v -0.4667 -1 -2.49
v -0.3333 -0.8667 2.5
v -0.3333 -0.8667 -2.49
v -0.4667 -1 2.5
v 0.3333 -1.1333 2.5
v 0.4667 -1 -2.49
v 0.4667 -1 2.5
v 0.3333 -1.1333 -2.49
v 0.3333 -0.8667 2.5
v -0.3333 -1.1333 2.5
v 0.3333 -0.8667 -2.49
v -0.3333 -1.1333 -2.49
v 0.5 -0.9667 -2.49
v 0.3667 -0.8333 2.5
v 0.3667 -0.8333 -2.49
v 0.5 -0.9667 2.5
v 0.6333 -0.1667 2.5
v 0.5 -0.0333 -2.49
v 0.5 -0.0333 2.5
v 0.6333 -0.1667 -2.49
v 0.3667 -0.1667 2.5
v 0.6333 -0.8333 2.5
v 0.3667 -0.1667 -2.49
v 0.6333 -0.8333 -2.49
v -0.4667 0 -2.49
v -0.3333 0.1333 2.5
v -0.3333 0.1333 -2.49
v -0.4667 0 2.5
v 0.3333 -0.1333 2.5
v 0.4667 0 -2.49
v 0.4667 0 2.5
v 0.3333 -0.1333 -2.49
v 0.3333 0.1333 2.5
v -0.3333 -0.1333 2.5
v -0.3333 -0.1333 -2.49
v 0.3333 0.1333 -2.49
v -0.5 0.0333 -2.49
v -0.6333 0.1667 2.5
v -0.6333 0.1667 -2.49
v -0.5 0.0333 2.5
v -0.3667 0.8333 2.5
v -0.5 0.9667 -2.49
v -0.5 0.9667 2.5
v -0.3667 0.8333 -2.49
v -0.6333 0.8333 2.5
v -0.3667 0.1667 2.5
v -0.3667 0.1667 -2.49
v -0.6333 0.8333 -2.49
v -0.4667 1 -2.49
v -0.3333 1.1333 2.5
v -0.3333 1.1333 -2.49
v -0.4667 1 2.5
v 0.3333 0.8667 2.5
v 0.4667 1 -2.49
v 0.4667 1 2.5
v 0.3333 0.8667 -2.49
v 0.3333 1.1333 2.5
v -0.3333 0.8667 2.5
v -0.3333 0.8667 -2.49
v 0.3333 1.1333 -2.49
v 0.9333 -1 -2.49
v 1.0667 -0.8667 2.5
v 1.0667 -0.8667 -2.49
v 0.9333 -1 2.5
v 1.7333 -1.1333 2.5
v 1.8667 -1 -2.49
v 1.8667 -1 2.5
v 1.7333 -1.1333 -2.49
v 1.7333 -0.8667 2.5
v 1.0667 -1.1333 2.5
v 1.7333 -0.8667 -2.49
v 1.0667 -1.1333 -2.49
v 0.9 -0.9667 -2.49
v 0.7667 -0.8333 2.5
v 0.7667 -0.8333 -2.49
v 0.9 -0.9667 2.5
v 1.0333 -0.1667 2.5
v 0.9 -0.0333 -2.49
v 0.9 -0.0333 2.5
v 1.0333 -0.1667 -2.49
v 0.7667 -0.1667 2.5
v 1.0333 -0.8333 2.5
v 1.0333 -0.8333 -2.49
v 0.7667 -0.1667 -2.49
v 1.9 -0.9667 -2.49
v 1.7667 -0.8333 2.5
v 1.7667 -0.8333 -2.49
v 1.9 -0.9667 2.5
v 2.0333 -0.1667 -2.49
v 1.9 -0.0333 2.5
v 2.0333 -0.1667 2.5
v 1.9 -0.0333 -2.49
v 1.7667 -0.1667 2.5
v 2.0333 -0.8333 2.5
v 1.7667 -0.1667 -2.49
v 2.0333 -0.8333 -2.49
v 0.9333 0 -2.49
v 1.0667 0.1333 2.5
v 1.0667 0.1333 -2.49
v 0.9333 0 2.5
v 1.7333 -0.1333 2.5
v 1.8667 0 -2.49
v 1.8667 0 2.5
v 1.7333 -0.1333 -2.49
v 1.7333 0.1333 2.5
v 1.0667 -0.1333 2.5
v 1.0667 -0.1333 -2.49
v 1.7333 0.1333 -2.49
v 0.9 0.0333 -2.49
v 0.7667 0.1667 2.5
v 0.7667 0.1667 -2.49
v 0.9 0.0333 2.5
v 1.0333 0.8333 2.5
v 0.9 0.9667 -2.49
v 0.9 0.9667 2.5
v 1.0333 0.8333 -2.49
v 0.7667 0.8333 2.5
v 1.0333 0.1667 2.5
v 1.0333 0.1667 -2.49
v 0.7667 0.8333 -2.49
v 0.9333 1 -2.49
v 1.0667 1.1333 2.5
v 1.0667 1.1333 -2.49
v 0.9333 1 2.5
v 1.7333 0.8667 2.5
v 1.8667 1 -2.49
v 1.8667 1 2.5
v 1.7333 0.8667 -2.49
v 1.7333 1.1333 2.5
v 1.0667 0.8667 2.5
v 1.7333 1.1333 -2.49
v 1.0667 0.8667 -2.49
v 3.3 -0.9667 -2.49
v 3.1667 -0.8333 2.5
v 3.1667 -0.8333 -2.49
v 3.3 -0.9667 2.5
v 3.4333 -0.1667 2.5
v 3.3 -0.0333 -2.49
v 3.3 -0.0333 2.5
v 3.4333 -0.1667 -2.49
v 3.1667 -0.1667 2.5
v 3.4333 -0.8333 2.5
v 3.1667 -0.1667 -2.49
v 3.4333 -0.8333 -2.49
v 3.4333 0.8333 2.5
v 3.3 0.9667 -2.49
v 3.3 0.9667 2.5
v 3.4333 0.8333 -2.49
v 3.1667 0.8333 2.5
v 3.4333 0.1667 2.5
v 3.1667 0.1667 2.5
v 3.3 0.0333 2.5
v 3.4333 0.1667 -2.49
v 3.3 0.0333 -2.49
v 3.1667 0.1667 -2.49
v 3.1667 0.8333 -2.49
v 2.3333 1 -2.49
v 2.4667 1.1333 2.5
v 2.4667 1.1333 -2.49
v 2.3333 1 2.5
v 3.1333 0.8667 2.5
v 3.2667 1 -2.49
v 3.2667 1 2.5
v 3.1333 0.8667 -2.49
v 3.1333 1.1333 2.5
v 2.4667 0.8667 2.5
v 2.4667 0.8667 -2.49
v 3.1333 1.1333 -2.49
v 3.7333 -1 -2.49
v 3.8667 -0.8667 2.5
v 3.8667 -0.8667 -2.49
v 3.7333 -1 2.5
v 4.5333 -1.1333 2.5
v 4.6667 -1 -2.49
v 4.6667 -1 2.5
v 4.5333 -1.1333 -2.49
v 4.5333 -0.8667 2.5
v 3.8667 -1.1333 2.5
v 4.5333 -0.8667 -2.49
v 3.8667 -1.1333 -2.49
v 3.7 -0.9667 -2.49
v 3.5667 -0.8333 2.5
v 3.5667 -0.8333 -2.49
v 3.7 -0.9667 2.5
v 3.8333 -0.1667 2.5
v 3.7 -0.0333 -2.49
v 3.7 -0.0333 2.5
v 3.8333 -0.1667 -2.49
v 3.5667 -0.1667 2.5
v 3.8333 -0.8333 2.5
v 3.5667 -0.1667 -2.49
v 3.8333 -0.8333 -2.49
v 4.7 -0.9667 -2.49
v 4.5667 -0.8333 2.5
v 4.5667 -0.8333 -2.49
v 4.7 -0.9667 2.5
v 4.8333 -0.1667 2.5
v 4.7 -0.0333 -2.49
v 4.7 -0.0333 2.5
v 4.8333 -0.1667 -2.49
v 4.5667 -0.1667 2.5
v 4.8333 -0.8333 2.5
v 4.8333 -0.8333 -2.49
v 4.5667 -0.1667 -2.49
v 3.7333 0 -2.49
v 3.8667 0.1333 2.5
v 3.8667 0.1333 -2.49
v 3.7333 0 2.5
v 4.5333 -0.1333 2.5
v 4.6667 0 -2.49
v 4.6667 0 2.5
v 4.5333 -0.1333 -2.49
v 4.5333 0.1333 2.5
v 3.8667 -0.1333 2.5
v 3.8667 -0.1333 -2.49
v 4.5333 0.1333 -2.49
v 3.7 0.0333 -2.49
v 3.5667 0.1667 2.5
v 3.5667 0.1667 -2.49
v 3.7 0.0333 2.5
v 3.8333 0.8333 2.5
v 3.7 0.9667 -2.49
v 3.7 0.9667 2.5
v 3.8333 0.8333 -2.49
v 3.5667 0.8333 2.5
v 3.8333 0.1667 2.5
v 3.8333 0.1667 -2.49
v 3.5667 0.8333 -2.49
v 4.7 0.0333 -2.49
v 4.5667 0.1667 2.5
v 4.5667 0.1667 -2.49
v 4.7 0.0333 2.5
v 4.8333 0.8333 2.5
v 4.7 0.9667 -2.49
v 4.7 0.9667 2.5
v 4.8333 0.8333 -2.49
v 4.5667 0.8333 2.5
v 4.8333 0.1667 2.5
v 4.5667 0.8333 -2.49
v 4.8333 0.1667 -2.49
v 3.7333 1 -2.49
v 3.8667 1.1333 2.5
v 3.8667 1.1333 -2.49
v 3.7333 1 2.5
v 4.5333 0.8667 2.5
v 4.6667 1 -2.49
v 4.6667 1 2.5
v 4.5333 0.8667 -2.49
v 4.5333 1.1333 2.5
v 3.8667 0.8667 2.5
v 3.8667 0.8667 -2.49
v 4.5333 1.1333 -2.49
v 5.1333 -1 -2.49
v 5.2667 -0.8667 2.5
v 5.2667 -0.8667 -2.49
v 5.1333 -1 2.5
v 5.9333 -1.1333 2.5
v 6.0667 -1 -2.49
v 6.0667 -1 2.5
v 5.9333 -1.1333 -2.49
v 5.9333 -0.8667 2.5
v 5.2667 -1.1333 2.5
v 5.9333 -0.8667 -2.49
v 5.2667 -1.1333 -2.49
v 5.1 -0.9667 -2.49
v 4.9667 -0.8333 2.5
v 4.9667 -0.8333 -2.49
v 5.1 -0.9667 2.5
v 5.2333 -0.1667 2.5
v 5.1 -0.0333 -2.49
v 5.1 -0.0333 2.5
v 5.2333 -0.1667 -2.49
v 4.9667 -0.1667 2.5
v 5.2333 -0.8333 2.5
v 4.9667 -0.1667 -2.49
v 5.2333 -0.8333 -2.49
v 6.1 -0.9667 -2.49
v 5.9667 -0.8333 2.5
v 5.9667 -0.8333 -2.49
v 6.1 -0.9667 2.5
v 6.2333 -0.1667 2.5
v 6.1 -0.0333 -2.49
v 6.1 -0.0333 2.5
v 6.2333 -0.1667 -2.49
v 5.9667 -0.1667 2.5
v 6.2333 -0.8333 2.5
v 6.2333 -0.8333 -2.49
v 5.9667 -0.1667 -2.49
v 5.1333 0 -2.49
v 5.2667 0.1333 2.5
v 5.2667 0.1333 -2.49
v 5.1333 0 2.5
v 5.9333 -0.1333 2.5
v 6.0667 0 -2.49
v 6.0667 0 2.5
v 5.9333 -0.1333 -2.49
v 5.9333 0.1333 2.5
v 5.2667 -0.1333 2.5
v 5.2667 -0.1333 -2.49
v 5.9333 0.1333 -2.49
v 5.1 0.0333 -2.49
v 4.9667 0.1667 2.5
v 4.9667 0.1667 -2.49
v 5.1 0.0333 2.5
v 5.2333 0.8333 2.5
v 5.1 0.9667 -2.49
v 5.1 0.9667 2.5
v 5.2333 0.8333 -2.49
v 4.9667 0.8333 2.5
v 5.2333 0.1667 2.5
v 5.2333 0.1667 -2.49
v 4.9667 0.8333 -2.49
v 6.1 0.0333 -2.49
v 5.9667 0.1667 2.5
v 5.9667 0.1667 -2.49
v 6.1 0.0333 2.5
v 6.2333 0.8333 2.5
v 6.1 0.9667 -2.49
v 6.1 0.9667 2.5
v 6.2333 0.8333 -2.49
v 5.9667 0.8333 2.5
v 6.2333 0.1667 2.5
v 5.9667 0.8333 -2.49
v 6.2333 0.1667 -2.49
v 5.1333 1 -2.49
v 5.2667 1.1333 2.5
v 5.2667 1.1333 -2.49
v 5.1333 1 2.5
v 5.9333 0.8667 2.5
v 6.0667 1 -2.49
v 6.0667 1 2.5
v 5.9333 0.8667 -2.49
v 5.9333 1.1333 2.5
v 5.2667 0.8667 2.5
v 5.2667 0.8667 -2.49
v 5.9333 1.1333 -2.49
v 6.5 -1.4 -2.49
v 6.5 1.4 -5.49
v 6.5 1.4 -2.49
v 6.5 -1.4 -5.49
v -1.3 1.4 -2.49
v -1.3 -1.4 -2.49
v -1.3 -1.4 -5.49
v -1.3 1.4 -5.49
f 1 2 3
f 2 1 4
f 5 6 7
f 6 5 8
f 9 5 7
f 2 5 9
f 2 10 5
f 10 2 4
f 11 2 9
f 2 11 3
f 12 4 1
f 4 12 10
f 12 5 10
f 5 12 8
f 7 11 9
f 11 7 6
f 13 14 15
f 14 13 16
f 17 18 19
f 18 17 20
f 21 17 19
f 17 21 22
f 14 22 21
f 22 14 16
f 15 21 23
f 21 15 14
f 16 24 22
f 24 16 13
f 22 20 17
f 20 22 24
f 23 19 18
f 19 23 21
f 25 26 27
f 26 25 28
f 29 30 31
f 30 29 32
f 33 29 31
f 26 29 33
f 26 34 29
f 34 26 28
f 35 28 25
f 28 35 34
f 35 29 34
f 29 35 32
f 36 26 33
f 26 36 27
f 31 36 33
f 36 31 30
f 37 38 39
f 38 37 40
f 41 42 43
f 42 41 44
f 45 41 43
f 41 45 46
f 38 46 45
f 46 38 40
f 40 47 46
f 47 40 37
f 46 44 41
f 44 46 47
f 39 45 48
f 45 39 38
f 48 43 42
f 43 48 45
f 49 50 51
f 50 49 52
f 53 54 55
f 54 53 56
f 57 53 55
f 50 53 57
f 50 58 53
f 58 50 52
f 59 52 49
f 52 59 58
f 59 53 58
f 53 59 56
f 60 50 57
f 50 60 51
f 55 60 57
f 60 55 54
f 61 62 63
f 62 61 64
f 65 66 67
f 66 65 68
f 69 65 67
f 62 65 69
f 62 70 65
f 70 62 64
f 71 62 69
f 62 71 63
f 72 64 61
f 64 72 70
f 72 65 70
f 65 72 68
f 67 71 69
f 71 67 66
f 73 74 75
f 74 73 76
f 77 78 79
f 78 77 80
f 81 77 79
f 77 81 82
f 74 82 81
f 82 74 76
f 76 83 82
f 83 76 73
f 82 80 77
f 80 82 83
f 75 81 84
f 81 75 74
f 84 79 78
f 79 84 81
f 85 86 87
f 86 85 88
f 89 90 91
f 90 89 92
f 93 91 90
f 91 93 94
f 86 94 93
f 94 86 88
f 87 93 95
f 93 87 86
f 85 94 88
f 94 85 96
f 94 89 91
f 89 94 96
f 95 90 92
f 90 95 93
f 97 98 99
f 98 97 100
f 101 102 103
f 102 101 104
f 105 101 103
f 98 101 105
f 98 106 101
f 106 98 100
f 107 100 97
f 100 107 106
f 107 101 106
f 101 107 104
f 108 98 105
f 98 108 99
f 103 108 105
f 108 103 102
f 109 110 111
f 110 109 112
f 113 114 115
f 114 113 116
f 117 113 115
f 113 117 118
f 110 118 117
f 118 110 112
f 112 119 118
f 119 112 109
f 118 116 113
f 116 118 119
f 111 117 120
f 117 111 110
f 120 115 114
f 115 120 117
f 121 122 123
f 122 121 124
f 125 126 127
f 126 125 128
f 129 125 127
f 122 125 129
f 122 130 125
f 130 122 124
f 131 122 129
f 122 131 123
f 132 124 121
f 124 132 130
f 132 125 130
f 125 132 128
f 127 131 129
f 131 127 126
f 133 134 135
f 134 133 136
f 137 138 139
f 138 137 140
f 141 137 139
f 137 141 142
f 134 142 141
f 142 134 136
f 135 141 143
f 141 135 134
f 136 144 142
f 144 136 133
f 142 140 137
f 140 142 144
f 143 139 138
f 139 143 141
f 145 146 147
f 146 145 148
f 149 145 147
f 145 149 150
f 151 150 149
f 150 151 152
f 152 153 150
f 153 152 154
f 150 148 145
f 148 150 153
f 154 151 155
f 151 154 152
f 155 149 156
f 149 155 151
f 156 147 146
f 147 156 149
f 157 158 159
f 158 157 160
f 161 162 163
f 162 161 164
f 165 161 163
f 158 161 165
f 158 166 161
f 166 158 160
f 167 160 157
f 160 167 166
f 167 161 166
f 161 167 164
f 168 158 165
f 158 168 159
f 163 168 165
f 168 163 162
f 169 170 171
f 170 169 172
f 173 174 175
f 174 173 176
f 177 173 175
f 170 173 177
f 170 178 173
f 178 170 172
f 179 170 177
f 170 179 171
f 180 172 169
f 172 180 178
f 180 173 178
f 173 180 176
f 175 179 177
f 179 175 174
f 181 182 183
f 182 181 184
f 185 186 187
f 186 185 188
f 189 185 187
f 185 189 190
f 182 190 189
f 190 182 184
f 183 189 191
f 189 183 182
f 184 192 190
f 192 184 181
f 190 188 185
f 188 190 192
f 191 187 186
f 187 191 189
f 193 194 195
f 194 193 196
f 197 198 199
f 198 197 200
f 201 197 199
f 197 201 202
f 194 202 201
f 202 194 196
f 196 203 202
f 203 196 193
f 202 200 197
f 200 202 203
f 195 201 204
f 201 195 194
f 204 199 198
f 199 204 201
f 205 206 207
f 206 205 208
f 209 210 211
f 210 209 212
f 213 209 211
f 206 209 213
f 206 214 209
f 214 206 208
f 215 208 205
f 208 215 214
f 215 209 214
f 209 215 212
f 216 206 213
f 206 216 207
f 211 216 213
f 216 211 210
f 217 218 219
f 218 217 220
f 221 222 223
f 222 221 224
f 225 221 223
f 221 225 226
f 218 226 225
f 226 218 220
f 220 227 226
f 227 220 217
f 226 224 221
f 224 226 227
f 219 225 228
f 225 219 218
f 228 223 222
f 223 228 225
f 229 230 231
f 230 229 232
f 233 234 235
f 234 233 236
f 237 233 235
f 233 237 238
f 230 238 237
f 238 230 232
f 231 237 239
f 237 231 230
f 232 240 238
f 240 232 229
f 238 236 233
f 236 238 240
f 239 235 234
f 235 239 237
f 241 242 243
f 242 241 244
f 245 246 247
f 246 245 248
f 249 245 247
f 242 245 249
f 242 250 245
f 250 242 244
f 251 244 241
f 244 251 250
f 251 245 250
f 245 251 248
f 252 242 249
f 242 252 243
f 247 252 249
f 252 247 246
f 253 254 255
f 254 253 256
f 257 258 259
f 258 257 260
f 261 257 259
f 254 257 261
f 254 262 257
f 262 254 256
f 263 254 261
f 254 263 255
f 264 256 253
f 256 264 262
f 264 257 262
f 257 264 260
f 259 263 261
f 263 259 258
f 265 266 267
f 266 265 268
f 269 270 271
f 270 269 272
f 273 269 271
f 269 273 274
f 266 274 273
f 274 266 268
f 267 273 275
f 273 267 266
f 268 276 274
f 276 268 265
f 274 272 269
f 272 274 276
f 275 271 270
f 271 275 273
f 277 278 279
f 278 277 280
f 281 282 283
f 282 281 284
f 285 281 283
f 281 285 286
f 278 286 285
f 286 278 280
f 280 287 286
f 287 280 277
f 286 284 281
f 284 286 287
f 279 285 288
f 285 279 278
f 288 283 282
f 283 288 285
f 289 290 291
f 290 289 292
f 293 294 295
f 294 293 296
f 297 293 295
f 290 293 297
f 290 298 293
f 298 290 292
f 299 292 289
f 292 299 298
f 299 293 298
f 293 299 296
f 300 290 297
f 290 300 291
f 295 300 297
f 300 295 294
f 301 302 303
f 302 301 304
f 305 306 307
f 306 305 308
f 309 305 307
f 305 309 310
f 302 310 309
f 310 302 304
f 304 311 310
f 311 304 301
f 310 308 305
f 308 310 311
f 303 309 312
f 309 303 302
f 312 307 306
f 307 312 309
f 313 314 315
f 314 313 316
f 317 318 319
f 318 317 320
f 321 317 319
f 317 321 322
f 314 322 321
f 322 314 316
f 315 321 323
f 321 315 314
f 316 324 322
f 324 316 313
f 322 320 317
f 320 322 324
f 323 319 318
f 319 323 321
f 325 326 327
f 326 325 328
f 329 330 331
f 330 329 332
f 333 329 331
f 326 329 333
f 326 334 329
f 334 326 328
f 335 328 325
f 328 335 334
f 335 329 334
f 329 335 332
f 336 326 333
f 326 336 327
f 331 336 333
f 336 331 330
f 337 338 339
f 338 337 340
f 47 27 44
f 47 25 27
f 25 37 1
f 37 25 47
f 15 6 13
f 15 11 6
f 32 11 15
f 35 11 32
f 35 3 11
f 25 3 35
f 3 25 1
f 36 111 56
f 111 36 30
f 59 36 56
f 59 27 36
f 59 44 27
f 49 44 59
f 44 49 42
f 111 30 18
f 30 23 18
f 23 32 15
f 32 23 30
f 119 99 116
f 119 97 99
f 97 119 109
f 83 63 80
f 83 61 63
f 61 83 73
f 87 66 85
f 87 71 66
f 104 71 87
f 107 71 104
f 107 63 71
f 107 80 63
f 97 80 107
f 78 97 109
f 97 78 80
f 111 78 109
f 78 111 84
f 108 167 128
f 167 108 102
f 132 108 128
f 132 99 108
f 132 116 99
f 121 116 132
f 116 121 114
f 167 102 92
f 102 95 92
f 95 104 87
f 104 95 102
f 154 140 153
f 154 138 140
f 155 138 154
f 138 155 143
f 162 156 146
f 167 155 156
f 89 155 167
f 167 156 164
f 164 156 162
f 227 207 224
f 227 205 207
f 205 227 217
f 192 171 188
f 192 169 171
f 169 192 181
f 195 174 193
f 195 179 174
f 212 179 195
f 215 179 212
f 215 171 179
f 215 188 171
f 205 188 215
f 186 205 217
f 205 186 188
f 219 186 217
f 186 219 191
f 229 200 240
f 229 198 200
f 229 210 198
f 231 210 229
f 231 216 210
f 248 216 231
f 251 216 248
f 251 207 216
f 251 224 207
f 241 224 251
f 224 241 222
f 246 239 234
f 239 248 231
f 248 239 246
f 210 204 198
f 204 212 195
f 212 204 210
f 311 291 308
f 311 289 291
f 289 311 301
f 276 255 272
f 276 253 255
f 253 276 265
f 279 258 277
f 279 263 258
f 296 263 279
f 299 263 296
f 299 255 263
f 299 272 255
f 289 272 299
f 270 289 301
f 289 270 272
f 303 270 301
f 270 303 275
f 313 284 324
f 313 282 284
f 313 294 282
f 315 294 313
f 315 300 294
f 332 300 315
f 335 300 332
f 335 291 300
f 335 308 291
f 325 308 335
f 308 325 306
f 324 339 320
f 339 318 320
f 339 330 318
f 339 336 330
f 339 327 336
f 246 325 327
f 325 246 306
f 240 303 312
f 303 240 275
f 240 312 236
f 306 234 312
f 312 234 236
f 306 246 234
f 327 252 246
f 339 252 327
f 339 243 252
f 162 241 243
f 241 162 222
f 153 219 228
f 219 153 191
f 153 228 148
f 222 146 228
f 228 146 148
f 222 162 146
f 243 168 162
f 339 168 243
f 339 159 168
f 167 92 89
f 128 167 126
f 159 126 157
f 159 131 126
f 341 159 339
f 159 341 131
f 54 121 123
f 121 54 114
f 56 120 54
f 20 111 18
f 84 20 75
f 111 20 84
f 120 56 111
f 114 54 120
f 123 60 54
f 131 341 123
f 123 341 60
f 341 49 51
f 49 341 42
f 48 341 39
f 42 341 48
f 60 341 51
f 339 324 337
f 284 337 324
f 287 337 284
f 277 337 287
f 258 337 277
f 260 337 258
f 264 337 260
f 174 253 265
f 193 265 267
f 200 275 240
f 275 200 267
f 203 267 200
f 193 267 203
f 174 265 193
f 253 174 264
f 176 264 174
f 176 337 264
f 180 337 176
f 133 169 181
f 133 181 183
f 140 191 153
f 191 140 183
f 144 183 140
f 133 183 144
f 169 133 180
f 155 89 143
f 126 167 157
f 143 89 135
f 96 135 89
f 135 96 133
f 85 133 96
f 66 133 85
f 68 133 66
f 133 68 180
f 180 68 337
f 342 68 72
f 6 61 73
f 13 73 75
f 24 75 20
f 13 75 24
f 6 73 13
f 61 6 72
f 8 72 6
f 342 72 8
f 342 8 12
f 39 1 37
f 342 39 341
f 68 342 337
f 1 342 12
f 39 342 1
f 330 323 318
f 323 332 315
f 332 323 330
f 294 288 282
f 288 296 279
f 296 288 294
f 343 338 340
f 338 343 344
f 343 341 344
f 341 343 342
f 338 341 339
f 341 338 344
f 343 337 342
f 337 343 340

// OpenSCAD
// file: bitops.scad
function bit(p) = pow(2,(p));
function _BTEST(x, abit) = x % (abit+abit) >= abit;
function BTEST(x, abit) = _BTEST(x, bit(abit));

function BIT(x, abit=0) = x % (bit(abit)+bit(abit)); 


//echo("5 :", BTEST(5,2), BTEST(5,1), BTEST(5,0));
//echo("5 :", BIT(5,2), BIT(5,1), BIT(5,0));

//=================================
// Bit manipulation
//=================================

function getdigit(x, pos=1) = floor(fract(x/pow(10,pos))*10);

function fract(x) = x - floor(x); 

function LSHIFT(x, pos=1, base=2) = x*pow(base,pos); 
function RSHIFT(x, pos=1, base=2) = floor(x/pow(base, pos));
function RSHIFTPART(x, pos=1, base=2) = x % pow(base, pos);
function lowbit(x, base=2) = x - LSHIFT(RSHIFT(x, base=base), base=base);

function BIT(x, pos=0, base=2) = lowbit(RSHIFT(x, pos,base), base=base);
//function BTEST(x, pos=0, base=2) = BIT(x,pos,base)>0;
// file: SegmentedNumber.scad
/*
	This module creates seven segment display digits
*/

include <bitops.scad>


joinfactor = 0.01;
gap = 0.4;
digitwidth = 1;
digitdepth = 2;
scalar = 30;


/*
	segment

	An array of 2D coordinates which define the Outline
	for a single segment of the seven segement display.

	This single segment is laid out horizontally, and is
	centered around the origin.
*/
// Outline of a single segment

segment =[ 
	[-14/scalar, 0], 
	[-10/scalar, -4/scalar], 
	[10/scalar, -4/scalar], 
	[14/scalar, 0], 
	[10/scalar, 4/scalar], 
	[-10/scalar, 4/scalar]];

/*
	seglocs

	An array of translations and rotations which places
	each segment in the proper place in the seven segment
	display.


*/
// Take the template of a segment, and give appropriate
// translations and rotations to put it in place to form a number.
// for each segment there is a tuple:
// [trans], rot
// [trans] is a triplet that indicates the translation
// rot - is the angle of rotation around the z-axis

seglocs = [
	[[0,-1.0,0], 0],
	[[-0.5,-0.5,0],90],
	[[0.5,-0.5,0],90],
	[[0,0,0],0],
	[[-0.5,0.5,0],90],
	[[0.5,0.5,0],90],
	[[0,1.0,0],0]
];

/*
Digit Information

The seven segments of the display (left), 
each have the number indicated (right)
	 __			6
	|  |	4		5
	 --			3
	|  |	1		2
	 --			0

 A single 8-bit number is used to indicate which
 segments are active for any single digit.  If a bit
 is set, then that particular segment is active.
*/

DigitSegments = [
			119,	// 0	0111 0111
			36,		// 1	0010 0100
			107,	// 2	0110 1011
			109,	// 3	0110 1101
			60,		// 4	0011 1100
			93,		// 5
			95,		// 6
			100,	// 7
			127,	// 8
			125		// 9
			];


function value(astr)=search(astr,"0123456789")[0]; 

/*
	DisplayDigit

	Display a single digit
	iNumber - the single digit to Display
	height - how tall to make it, default to '1'
*/

module DisplayDigit(iNumber, height = 1)
{        
    for (iSeg = [0:6])
	{
		if (BTEST(DigitSegments[iNumber],iSeg))
        {
			linear_extrude(height=height, center=true) {
				translate(seglocs[iSeg][0])
				rotate(seglocs[iSeg][1])
				polygon(points = segment, paths = [[0,1,2,3,4,5]]);
			}
        }
	}
}

module DisplayNumber(number, height=1)
{
	digitstr = str(number);
	count = len(digitstr);
	echo("len: ", count);

	for (counter = [0:count-1])
	{
		digitchar = digitstr[counter];
		digitvalue = value(digitchar);
		
		echo(digitchar, " ", digitvalue);
		translate([(counter)*(digitwidth+gap),0,0])
		DisplayDigit(digitvalue, height);
	}
}

module RenderNumberPlate(number, thickness=1, height=1)
{
	digitstr = str(number);
	count = len(digitstr);
	platewidth = count*(digitwidth+gap)+2*gap;
	platedepth = digitdepth+2*gap;

	DisplayNumber(number, height);

	// Display the plate
	color([0.2, 0.7, 0.3])
	translate([-digitwidth/2-gap*2, -digitdepth/2-gap, -thickness-height/2+joinfactor])
	cube(size=[platewidth, platedepth, thickness]);
}
// main file
include <SegmentedNumber.scad>

//scale([15, 15, 1])

//DisplayNumber(5551212, 7, 5);
//DisplayNumber(213, 3, 4);

//scale([25, 25, 1])
//RenderNumberPlate(1879, 4, thickness=10, height=15);
//RenderNumberPlate(2028, 4, thickness=3, height=5);

// BUGBUG - '888' renders as '887'
//scale([25, 25, 1])
RenderNumberPlate(56788, thickness=3, height=5);
